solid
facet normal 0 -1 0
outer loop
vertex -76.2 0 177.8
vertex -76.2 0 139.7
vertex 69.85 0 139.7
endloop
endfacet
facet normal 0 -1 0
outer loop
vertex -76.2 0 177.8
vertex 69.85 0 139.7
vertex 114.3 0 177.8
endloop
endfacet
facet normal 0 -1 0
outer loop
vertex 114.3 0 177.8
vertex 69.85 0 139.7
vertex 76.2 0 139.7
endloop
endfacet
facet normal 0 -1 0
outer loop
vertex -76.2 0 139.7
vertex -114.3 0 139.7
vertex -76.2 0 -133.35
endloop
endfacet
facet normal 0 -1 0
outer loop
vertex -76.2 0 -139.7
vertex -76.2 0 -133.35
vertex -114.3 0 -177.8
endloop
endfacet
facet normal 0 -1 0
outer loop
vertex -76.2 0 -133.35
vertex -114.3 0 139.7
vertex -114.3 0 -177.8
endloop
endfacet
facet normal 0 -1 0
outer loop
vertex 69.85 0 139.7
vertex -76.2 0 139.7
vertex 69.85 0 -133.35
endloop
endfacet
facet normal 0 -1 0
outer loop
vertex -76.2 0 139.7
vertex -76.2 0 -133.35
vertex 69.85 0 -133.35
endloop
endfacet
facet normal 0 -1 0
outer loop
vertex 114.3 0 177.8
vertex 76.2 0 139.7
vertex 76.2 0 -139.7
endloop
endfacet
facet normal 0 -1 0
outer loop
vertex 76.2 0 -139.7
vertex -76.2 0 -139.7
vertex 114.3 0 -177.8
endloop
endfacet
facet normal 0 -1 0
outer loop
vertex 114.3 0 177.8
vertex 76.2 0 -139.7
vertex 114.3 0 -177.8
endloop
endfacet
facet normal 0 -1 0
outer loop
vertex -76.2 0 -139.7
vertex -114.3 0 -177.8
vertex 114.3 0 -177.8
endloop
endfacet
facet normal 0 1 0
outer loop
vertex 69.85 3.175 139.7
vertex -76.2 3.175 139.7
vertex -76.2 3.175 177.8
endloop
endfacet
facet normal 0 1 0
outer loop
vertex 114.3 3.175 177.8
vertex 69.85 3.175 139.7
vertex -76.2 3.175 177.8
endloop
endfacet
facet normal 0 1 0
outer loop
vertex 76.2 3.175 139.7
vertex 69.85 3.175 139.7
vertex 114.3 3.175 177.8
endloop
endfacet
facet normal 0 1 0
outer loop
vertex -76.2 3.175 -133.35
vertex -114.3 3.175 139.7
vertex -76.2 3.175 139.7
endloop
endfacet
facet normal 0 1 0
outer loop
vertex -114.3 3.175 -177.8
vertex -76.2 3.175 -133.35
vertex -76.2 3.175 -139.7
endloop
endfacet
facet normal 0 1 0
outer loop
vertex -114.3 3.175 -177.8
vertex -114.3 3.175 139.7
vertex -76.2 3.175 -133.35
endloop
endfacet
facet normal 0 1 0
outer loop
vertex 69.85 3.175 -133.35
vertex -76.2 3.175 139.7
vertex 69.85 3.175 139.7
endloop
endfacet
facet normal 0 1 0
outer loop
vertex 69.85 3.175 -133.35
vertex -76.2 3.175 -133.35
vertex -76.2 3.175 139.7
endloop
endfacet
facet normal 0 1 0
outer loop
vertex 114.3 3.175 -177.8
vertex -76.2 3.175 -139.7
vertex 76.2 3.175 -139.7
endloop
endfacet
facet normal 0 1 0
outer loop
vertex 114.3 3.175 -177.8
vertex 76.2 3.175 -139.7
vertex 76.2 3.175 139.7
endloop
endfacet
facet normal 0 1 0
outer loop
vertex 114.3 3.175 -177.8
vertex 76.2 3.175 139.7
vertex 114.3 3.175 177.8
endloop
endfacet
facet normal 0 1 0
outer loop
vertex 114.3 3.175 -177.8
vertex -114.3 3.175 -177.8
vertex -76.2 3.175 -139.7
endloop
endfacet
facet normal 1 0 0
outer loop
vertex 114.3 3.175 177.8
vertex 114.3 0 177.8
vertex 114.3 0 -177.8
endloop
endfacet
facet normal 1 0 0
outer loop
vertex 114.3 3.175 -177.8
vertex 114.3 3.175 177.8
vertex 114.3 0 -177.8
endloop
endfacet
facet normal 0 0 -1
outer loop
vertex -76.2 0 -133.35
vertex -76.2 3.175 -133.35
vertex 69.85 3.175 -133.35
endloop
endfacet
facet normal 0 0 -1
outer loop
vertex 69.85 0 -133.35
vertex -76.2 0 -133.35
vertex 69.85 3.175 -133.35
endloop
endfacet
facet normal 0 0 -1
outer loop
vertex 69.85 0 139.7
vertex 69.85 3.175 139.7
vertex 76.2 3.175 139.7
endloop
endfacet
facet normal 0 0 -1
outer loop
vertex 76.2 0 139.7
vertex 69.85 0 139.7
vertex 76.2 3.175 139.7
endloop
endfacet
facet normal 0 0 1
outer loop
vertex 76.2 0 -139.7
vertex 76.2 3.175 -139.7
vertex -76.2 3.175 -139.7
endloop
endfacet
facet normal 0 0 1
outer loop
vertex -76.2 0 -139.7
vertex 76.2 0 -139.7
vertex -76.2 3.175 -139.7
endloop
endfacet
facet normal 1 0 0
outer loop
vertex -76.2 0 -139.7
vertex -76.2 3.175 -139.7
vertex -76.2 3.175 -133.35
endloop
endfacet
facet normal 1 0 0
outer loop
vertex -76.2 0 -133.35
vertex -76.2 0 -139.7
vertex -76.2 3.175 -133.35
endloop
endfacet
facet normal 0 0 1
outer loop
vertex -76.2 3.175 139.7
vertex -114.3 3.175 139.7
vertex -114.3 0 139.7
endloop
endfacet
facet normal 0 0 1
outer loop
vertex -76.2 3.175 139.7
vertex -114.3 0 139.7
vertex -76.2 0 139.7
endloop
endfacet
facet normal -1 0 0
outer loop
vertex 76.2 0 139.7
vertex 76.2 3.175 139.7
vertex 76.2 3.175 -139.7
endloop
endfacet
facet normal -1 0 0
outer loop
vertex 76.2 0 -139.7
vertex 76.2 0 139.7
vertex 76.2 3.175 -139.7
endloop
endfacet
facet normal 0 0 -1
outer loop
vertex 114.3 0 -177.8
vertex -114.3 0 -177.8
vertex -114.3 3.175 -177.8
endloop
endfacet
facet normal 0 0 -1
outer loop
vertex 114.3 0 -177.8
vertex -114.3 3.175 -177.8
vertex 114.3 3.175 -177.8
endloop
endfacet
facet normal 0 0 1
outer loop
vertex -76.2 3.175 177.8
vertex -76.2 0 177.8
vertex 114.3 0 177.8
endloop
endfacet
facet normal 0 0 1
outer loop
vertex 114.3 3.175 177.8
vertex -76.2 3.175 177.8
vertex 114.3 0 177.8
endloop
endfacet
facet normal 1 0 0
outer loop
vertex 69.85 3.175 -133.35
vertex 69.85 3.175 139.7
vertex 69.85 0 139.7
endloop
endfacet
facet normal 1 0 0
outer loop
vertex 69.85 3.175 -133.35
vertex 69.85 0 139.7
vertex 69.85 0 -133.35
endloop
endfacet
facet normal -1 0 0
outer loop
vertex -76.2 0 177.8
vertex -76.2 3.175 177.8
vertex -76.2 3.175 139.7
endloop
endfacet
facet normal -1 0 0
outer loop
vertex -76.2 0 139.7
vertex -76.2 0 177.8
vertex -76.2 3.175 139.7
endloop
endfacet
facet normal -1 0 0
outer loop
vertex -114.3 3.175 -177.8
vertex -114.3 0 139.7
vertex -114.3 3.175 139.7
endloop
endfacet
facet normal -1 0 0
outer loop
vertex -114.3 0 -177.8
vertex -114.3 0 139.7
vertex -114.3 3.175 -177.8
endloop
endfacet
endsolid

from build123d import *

# Parameters (mm, degrees)
SKETCH2_W           = 228.6
SKETCH2_H           = 355.6
BOSS_EXTRUDE1_DEPTH = 3.175
SKETCH3_W           = 6.35
SKETCH3_H           = 273.05
CUT_EXTRUDE1_DEPTH  = 212.393970172
SKETCH4_W           = 38.1
SKETCH4_H           = 38.1
CUT_EXTRUDE2_DEPTH  = 212.393970172


with BuildPart() as part:
    # Sketch2 → Boss-Extrude1 (new body)
    with BuildSketch(Plane(origin=(0, 0, 0), x_dir=(1, 0, 0), z_dir=(0, 1, 0))):
        Rectangle(SKETCH2_W, SKETCH2_H)
    extrude(amount=BOSS_EXTRUDE1_DEPTH)

    # Sketch3 → Cut-Extrude1 (cut, through all)
    with BuildSketch(Plane(origin=(0, 3.175, 0), x_dir=(1, 0, 0), z_dir=(0, 1, 0))):
        Polygon((76.2, 139.7), (-76.2, 139.7), (-76.2, 133.35), (69.85, 133.35), (76.2, 133.35), align=None)
        with Locations((73.025, -3.175)):
            Rectangle(SKETCH3_W, SKETCH3_H)
    extrude(amount=-CUT_EXTRUDE1_DEPTH, mode=Mode.SUBTRACT)

    # Sketch4 → Cut-Extrude2 (cut, through all)
    with BuildSketch(Plane(origin=(0, 3.175, 0), x_dir=(1, 0, 0), z_dir=(0, 1, 0))):
        with Locations((-95.25, -158.75)):
            Rectangle(SKETCH4_W, SKETCH4_H)
    extrude(amount=-CUT_EXTRUDE2_DEPTH, mode=Mode.SUBTRACT)


solid = part.part
